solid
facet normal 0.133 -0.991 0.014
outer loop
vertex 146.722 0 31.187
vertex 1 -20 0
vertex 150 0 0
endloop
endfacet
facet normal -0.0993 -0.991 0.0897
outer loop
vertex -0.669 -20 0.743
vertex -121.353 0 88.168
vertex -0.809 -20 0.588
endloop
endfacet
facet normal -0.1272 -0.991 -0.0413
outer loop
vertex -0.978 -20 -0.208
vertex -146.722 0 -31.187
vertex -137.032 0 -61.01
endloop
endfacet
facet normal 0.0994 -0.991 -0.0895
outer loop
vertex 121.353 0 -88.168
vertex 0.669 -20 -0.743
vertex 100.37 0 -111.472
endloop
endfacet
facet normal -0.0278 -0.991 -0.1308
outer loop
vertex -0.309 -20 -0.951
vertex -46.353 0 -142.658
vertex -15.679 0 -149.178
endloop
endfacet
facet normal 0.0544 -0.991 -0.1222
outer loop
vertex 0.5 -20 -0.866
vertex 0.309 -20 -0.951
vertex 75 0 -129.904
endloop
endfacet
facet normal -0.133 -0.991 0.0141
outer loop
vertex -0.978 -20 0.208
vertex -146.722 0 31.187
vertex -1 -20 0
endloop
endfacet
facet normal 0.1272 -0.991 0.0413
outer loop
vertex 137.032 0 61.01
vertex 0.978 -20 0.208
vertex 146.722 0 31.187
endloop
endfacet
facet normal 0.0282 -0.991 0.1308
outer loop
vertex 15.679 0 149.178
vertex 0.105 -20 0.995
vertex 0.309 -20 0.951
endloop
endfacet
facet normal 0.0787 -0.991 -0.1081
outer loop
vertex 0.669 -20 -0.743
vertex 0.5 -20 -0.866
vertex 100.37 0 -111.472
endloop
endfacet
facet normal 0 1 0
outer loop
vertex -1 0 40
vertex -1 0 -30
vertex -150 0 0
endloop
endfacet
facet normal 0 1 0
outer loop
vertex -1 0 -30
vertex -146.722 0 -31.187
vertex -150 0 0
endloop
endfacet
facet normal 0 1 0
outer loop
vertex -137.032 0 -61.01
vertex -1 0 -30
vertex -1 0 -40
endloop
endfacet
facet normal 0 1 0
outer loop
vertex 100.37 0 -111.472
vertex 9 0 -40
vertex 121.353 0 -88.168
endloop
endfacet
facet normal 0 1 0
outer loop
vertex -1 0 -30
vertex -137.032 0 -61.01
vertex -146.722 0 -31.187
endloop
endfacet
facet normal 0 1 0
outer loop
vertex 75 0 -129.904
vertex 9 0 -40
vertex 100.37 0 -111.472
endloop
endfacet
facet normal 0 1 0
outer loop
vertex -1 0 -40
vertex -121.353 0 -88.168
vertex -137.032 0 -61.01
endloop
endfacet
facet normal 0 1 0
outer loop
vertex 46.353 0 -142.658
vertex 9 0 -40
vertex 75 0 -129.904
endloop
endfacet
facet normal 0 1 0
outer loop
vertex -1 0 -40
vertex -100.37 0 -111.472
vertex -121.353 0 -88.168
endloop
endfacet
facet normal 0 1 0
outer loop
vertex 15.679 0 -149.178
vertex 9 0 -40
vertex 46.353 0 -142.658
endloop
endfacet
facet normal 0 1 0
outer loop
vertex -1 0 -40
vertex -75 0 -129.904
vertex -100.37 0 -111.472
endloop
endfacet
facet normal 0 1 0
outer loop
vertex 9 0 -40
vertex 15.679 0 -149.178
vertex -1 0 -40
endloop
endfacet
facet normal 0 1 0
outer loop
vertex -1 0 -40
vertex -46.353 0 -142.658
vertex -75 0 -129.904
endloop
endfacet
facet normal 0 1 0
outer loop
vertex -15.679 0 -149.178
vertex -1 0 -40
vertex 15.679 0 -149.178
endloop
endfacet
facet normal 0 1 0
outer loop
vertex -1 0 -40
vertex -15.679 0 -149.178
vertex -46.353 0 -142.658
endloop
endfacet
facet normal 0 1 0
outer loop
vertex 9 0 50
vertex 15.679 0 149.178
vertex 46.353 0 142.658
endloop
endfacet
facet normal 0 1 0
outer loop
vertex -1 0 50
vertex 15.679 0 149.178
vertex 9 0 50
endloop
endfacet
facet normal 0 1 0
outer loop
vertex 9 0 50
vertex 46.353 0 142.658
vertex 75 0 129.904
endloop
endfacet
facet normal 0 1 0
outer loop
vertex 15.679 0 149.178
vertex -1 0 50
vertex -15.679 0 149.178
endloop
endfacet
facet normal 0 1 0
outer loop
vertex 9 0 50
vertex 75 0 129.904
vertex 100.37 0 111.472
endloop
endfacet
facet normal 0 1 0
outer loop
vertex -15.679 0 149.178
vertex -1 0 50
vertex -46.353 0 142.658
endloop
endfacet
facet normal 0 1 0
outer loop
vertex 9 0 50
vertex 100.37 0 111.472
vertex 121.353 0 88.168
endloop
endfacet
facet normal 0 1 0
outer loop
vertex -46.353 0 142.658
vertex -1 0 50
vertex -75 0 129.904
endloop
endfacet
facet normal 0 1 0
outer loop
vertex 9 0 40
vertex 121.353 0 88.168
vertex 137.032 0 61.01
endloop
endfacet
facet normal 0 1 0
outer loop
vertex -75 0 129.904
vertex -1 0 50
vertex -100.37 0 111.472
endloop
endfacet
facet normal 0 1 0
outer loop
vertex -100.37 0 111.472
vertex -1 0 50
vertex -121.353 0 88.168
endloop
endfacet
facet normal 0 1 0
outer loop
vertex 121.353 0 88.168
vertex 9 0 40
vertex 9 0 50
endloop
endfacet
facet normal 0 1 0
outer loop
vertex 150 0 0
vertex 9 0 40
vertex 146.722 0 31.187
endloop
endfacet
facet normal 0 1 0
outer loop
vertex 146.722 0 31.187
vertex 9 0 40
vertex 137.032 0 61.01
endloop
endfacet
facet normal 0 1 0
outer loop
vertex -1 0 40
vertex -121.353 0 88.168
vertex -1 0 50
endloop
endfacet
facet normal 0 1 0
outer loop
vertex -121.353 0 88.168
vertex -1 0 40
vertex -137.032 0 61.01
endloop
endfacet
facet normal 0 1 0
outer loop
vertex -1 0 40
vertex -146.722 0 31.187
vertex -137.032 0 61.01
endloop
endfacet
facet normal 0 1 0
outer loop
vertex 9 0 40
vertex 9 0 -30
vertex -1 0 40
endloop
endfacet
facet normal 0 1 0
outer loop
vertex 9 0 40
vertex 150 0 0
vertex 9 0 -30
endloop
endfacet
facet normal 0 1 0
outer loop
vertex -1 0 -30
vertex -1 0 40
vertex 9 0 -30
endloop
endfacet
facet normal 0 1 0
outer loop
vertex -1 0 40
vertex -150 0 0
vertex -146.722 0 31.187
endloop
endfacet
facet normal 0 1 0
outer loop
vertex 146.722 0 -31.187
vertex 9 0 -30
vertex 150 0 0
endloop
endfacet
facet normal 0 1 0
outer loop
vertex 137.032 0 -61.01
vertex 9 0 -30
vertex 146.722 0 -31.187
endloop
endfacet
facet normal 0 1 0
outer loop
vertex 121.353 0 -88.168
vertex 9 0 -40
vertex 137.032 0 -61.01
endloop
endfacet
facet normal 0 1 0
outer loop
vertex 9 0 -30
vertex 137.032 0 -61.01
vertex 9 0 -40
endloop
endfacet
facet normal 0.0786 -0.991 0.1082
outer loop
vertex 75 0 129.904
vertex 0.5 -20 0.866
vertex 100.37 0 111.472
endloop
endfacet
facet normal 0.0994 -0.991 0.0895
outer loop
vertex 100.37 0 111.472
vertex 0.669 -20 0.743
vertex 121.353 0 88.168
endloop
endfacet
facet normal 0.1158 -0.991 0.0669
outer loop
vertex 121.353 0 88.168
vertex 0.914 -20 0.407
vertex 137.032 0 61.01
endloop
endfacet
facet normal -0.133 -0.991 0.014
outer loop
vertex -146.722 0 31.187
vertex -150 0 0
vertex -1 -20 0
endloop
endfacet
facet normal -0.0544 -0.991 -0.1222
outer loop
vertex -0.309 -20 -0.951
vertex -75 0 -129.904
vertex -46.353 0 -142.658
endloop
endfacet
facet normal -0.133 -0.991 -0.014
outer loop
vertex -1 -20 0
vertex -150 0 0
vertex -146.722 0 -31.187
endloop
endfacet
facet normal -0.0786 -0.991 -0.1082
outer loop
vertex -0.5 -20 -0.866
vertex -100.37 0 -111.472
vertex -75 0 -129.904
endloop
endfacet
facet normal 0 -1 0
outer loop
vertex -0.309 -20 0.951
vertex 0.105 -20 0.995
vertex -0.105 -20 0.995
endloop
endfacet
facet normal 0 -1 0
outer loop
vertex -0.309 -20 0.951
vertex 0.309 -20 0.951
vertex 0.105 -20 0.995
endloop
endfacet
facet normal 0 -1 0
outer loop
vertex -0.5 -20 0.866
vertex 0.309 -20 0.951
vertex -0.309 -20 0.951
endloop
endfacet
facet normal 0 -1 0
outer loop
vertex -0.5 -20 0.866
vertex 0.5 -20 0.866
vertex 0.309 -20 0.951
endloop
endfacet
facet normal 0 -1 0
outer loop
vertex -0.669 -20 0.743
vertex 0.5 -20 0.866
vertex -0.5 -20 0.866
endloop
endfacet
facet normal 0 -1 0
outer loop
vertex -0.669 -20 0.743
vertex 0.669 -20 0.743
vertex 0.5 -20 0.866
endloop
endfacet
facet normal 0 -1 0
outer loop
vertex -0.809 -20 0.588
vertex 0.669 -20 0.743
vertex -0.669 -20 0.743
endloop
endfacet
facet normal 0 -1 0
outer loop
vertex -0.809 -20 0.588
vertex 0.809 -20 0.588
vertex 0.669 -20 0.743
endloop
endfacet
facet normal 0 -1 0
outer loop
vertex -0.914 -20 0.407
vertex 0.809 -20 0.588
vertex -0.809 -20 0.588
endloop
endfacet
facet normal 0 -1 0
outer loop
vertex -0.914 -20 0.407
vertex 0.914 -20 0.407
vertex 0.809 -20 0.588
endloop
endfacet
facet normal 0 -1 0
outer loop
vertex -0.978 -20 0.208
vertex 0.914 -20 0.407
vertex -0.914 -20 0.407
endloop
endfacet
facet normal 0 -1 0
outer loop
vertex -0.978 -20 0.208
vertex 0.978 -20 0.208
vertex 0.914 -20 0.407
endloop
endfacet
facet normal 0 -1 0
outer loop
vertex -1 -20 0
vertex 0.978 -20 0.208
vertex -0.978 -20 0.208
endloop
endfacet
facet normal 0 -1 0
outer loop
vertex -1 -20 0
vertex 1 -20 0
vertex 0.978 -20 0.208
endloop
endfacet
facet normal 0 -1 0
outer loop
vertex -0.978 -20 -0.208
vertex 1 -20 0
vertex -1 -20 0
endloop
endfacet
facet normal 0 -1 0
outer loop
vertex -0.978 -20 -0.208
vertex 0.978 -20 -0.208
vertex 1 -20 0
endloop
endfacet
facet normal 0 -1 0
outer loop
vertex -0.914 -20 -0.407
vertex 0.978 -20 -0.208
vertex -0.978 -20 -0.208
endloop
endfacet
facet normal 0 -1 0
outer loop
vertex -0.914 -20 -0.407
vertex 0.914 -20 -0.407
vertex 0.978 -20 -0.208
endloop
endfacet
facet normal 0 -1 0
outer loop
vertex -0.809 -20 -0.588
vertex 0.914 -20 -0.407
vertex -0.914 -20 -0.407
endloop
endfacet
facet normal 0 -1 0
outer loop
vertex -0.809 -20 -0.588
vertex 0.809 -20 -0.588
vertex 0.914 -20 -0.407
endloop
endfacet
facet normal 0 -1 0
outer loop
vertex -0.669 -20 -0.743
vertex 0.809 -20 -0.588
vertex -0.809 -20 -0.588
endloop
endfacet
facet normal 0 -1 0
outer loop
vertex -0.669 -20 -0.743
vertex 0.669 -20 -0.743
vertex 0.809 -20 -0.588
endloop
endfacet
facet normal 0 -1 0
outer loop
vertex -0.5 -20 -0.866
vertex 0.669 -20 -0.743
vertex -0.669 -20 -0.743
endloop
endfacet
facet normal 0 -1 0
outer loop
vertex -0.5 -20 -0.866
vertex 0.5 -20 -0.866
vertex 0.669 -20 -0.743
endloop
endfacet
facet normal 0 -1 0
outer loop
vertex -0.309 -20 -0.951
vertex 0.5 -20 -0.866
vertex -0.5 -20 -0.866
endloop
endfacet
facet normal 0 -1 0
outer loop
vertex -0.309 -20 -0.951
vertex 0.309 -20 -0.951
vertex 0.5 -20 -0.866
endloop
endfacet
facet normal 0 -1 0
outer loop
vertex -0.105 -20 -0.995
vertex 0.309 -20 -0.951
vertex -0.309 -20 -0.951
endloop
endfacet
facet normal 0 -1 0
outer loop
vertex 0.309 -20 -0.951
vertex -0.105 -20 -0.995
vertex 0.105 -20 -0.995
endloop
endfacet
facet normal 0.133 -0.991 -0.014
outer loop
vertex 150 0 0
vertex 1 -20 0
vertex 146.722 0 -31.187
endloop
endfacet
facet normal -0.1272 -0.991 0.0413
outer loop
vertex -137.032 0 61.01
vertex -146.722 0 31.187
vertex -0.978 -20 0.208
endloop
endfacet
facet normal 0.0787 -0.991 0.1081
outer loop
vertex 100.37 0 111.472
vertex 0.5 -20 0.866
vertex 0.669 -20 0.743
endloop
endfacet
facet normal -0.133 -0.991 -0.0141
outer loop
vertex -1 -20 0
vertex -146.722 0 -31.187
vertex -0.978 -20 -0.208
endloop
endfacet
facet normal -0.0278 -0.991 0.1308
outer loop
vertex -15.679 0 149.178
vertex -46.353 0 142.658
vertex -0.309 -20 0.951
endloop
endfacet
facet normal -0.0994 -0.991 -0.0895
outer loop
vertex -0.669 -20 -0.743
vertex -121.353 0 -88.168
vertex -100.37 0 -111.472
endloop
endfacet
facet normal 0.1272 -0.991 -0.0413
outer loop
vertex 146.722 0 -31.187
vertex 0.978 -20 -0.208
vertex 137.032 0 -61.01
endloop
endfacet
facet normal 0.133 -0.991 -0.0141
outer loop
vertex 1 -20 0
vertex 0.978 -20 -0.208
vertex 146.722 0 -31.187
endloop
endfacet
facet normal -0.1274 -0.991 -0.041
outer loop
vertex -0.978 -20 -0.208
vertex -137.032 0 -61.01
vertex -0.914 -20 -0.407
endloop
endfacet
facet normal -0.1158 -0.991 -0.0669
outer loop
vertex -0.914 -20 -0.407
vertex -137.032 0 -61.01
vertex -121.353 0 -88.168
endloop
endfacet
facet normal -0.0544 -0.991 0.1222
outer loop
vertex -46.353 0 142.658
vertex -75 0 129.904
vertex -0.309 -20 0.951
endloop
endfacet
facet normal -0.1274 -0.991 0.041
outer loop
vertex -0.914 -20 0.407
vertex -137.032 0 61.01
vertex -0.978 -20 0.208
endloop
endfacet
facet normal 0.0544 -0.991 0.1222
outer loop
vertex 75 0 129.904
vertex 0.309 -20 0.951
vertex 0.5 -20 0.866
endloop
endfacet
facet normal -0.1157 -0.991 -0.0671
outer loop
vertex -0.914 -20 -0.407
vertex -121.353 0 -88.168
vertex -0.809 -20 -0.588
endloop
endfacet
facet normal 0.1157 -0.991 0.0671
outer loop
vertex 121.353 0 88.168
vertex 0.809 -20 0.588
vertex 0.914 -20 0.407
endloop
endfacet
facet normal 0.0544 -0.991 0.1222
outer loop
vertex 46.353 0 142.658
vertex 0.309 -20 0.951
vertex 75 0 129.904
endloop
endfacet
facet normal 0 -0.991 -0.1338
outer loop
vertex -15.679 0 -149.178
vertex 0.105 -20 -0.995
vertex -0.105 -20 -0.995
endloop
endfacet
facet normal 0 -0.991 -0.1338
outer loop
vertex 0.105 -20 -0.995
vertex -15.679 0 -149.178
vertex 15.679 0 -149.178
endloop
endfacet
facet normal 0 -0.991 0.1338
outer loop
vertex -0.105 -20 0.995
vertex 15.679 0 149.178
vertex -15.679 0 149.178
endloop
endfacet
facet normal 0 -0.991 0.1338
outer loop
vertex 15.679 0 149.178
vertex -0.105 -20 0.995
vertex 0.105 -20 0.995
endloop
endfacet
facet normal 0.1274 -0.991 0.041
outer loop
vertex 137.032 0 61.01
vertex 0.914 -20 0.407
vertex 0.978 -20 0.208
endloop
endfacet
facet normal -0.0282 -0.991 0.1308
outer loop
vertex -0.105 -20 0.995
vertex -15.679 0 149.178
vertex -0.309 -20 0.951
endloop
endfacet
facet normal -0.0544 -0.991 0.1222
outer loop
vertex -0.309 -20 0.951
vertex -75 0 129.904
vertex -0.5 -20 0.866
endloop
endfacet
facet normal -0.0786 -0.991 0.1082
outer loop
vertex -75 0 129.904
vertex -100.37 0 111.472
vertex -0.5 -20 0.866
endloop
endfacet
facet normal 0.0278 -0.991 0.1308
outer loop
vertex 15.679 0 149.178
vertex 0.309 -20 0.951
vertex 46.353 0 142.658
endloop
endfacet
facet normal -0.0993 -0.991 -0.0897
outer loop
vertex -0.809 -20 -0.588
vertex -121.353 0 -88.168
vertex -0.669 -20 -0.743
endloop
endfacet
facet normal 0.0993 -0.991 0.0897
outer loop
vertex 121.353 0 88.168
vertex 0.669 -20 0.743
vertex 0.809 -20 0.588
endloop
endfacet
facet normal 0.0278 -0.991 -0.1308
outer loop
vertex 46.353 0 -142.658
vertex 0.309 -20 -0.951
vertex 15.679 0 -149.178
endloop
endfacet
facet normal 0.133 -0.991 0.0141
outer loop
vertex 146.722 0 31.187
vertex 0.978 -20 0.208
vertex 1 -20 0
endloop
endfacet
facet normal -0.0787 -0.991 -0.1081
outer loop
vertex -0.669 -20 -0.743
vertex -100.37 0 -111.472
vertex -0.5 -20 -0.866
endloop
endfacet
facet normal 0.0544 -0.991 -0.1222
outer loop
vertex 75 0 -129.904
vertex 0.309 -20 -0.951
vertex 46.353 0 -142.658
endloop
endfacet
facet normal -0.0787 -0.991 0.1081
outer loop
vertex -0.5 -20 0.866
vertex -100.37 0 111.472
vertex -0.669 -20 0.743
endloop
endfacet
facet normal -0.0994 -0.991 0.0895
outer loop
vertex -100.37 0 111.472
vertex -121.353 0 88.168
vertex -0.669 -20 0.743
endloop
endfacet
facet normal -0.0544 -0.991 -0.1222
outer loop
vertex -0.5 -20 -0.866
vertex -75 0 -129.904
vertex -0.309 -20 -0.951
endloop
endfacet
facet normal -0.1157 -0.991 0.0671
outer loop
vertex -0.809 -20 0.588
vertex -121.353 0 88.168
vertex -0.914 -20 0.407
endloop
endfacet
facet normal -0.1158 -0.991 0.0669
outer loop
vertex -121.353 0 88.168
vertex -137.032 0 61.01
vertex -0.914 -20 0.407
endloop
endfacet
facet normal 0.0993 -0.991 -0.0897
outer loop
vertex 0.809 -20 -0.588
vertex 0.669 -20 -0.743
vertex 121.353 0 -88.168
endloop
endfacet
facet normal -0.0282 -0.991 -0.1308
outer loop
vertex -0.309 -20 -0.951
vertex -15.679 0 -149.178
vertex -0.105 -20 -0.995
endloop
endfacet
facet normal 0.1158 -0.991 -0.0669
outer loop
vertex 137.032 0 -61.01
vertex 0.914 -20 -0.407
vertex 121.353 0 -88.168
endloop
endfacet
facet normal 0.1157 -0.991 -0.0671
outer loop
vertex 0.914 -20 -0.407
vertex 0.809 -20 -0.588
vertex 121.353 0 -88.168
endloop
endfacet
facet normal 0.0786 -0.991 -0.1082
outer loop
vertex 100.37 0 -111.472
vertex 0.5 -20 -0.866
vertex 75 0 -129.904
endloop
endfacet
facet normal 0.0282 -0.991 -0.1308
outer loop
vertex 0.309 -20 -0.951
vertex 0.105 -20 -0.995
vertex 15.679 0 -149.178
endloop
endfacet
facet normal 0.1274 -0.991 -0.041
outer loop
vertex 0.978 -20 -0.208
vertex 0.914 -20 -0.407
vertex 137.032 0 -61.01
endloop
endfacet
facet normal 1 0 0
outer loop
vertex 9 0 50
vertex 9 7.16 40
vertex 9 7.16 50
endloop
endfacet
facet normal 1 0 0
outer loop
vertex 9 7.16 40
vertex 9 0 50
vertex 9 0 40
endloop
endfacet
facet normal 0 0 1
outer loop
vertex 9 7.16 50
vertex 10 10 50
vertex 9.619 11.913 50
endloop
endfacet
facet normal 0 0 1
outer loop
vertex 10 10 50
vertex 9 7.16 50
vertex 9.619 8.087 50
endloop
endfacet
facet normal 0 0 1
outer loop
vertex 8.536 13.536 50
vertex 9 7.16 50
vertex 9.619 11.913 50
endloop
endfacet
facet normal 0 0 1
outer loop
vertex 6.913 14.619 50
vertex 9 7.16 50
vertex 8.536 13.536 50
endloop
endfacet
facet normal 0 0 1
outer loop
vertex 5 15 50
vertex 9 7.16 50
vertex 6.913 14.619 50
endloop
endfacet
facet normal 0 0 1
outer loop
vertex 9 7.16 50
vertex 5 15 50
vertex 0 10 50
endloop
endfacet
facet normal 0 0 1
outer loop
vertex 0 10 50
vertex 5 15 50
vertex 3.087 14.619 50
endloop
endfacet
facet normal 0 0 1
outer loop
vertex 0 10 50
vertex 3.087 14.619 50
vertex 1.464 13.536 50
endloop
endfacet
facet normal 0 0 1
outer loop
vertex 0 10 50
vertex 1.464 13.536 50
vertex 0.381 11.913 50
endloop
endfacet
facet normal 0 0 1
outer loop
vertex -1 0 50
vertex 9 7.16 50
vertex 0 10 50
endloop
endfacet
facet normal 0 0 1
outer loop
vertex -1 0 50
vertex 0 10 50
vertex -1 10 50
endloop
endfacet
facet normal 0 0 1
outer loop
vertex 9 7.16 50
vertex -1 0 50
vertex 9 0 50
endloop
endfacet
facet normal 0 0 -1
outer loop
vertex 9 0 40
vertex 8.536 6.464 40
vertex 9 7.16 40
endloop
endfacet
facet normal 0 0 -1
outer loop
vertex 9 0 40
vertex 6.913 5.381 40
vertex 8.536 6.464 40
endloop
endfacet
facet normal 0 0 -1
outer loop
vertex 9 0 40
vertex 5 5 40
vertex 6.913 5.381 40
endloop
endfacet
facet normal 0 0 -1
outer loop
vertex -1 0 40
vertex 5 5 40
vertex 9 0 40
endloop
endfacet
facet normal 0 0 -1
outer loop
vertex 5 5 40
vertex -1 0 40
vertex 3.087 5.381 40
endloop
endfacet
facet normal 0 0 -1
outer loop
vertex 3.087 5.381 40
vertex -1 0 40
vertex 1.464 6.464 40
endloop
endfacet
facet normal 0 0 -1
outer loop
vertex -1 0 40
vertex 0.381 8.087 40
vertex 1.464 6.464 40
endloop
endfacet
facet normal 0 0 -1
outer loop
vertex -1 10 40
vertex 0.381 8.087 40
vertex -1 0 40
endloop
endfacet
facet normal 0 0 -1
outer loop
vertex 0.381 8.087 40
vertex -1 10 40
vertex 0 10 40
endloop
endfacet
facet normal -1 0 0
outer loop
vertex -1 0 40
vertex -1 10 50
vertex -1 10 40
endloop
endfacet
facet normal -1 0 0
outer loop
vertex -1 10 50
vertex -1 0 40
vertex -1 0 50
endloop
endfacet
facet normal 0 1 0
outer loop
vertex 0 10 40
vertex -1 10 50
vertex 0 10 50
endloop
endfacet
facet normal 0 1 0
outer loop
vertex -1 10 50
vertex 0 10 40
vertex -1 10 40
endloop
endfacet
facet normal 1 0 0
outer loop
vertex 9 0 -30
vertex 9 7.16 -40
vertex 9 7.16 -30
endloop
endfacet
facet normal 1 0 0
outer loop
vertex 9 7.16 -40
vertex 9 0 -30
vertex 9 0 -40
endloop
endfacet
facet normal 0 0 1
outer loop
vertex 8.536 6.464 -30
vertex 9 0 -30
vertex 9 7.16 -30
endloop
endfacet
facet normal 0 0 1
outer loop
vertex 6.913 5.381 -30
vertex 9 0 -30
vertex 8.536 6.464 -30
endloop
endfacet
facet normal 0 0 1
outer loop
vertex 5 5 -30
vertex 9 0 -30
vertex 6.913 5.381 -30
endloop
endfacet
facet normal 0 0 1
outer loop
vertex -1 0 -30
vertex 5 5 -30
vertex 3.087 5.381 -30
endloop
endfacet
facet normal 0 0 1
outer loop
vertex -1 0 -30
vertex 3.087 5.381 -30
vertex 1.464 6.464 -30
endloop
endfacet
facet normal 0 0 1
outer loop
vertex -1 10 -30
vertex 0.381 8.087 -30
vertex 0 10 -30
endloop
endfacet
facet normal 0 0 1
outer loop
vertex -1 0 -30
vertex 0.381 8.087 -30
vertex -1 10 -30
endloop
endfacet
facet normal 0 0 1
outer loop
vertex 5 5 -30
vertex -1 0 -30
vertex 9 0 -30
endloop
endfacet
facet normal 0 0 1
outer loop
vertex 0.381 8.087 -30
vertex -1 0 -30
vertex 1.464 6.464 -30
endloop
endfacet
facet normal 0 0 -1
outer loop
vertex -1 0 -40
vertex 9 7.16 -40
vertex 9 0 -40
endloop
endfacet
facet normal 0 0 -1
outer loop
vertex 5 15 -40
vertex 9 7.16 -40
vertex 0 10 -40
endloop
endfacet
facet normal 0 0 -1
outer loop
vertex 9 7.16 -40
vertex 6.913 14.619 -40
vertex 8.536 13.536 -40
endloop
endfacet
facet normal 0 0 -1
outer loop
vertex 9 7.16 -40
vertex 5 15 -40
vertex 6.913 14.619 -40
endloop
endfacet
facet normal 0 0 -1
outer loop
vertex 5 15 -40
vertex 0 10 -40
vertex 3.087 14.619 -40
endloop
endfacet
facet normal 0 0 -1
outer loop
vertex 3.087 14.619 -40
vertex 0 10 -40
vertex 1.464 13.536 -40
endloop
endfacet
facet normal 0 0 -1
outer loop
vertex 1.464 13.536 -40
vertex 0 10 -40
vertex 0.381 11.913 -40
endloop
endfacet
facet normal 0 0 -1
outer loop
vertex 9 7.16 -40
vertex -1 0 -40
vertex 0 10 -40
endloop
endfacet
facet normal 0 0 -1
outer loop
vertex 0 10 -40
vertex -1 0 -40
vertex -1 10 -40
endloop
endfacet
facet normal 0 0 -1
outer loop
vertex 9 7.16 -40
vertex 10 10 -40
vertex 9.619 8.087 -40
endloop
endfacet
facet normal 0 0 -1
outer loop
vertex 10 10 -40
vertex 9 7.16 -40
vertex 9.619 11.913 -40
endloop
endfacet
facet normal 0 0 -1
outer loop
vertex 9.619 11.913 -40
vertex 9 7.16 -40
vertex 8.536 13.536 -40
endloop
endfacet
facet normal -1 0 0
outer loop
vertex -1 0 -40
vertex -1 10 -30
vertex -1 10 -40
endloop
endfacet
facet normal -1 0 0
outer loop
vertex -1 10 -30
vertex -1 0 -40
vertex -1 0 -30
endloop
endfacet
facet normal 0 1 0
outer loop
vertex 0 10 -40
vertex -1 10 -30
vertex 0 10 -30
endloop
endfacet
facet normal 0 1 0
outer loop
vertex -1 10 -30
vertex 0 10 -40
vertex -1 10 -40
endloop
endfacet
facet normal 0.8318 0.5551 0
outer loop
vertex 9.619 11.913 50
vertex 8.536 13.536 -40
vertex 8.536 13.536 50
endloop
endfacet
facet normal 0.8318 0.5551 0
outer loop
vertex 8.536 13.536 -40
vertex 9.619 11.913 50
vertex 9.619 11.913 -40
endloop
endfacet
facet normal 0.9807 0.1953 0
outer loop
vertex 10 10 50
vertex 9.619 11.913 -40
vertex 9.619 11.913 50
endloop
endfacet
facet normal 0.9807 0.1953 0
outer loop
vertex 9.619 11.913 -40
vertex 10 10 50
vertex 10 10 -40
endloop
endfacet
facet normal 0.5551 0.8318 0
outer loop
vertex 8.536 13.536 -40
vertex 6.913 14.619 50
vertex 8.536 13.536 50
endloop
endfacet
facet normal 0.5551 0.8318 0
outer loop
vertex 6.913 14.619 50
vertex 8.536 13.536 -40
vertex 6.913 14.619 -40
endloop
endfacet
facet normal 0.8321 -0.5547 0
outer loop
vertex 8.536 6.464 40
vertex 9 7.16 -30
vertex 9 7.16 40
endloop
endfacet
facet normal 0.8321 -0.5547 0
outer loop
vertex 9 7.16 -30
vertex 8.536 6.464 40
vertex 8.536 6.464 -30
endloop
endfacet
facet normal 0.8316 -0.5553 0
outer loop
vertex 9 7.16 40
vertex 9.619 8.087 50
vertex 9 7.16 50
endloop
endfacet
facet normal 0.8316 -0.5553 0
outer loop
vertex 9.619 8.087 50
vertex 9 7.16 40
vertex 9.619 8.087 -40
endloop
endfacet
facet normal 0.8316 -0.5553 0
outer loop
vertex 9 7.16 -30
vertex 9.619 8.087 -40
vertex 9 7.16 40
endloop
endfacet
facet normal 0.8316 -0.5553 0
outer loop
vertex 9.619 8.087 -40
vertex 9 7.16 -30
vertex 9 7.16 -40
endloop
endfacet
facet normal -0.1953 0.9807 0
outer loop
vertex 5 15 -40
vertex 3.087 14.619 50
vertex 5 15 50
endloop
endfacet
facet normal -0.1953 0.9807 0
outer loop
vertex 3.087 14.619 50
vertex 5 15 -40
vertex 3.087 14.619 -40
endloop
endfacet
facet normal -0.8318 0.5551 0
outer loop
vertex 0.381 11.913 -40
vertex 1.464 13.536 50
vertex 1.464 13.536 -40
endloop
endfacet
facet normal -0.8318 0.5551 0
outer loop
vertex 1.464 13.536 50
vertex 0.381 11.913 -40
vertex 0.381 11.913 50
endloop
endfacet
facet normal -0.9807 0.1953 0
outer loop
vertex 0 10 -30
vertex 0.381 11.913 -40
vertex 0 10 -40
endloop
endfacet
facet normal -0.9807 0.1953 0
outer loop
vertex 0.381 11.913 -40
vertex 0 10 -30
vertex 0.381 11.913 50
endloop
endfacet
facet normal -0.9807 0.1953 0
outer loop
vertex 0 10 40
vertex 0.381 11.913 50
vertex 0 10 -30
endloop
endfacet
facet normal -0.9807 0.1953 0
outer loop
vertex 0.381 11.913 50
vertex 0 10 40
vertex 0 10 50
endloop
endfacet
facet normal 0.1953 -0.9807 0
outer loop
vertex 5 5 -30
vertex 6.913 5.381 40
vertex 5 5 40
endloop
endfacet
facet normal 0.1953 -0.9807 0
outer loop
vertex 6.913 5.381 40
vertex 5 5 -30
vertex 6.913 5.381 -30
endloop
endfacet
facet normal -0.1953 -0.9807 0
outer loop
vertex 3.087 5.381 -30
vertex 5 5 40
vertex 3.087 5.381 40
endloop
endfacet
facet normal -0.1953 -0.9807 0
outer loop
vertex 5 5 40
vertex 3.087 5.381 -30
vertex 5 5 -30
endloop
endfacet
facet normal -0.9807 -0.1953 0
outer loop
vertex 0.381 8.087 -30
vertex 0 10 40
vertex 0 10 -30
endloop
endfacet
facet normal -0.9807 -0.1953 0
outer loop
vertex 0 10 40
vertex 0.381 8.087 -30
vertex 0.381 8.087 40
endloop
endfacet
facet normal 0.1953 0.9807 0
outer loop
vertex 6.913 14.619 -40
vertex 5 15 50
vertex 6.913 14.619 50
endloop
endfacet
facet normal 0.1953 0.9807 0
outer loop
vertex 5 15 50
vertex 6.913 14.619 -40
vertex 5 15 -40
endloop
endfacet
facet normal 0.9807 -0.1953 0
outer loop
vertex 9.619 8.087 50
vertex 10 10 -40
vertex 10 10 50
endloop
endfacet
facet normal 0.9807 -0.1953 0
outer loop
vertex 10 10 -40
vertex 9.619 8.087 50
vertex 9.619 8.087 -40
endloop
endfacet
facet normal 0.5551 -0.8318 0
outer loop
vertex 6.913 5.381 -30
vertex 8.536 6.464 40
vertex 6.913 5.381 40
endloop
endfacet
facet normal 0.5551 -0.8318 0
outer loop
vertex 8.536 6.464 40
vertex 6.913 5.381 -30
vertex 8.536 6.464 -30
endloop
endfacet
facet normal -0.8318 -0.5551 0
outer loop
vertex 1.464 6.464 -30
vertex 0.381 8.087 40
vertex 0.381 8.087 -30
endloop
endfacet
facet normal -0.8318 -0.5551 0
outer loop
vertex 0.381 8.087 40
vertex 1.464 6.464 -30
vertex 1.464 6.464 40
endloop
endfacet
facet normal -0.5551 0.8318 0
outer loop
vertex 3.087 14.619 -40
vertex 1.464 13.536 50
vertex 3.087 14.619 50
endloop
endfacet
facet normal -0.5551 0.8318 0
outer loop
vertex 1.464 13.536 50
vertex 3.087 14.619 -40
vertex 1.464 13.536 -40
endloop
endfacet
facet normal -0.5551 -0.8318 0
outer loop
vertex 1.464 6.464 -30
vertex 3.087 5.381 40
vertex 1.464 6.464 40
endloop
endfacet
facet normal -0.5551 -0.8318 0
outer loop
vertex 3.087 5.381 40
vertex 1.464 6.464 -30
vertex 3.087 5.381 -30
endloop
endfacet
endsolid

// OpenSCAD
//shield
rotate([90,0,0])cylinder(20,150);
//handle
translate([-1,0,40])cube(10,35);
translate([-1,0,-40])cube(10,35);
translate([5,10,-40])cylinder(90,5,5); 
